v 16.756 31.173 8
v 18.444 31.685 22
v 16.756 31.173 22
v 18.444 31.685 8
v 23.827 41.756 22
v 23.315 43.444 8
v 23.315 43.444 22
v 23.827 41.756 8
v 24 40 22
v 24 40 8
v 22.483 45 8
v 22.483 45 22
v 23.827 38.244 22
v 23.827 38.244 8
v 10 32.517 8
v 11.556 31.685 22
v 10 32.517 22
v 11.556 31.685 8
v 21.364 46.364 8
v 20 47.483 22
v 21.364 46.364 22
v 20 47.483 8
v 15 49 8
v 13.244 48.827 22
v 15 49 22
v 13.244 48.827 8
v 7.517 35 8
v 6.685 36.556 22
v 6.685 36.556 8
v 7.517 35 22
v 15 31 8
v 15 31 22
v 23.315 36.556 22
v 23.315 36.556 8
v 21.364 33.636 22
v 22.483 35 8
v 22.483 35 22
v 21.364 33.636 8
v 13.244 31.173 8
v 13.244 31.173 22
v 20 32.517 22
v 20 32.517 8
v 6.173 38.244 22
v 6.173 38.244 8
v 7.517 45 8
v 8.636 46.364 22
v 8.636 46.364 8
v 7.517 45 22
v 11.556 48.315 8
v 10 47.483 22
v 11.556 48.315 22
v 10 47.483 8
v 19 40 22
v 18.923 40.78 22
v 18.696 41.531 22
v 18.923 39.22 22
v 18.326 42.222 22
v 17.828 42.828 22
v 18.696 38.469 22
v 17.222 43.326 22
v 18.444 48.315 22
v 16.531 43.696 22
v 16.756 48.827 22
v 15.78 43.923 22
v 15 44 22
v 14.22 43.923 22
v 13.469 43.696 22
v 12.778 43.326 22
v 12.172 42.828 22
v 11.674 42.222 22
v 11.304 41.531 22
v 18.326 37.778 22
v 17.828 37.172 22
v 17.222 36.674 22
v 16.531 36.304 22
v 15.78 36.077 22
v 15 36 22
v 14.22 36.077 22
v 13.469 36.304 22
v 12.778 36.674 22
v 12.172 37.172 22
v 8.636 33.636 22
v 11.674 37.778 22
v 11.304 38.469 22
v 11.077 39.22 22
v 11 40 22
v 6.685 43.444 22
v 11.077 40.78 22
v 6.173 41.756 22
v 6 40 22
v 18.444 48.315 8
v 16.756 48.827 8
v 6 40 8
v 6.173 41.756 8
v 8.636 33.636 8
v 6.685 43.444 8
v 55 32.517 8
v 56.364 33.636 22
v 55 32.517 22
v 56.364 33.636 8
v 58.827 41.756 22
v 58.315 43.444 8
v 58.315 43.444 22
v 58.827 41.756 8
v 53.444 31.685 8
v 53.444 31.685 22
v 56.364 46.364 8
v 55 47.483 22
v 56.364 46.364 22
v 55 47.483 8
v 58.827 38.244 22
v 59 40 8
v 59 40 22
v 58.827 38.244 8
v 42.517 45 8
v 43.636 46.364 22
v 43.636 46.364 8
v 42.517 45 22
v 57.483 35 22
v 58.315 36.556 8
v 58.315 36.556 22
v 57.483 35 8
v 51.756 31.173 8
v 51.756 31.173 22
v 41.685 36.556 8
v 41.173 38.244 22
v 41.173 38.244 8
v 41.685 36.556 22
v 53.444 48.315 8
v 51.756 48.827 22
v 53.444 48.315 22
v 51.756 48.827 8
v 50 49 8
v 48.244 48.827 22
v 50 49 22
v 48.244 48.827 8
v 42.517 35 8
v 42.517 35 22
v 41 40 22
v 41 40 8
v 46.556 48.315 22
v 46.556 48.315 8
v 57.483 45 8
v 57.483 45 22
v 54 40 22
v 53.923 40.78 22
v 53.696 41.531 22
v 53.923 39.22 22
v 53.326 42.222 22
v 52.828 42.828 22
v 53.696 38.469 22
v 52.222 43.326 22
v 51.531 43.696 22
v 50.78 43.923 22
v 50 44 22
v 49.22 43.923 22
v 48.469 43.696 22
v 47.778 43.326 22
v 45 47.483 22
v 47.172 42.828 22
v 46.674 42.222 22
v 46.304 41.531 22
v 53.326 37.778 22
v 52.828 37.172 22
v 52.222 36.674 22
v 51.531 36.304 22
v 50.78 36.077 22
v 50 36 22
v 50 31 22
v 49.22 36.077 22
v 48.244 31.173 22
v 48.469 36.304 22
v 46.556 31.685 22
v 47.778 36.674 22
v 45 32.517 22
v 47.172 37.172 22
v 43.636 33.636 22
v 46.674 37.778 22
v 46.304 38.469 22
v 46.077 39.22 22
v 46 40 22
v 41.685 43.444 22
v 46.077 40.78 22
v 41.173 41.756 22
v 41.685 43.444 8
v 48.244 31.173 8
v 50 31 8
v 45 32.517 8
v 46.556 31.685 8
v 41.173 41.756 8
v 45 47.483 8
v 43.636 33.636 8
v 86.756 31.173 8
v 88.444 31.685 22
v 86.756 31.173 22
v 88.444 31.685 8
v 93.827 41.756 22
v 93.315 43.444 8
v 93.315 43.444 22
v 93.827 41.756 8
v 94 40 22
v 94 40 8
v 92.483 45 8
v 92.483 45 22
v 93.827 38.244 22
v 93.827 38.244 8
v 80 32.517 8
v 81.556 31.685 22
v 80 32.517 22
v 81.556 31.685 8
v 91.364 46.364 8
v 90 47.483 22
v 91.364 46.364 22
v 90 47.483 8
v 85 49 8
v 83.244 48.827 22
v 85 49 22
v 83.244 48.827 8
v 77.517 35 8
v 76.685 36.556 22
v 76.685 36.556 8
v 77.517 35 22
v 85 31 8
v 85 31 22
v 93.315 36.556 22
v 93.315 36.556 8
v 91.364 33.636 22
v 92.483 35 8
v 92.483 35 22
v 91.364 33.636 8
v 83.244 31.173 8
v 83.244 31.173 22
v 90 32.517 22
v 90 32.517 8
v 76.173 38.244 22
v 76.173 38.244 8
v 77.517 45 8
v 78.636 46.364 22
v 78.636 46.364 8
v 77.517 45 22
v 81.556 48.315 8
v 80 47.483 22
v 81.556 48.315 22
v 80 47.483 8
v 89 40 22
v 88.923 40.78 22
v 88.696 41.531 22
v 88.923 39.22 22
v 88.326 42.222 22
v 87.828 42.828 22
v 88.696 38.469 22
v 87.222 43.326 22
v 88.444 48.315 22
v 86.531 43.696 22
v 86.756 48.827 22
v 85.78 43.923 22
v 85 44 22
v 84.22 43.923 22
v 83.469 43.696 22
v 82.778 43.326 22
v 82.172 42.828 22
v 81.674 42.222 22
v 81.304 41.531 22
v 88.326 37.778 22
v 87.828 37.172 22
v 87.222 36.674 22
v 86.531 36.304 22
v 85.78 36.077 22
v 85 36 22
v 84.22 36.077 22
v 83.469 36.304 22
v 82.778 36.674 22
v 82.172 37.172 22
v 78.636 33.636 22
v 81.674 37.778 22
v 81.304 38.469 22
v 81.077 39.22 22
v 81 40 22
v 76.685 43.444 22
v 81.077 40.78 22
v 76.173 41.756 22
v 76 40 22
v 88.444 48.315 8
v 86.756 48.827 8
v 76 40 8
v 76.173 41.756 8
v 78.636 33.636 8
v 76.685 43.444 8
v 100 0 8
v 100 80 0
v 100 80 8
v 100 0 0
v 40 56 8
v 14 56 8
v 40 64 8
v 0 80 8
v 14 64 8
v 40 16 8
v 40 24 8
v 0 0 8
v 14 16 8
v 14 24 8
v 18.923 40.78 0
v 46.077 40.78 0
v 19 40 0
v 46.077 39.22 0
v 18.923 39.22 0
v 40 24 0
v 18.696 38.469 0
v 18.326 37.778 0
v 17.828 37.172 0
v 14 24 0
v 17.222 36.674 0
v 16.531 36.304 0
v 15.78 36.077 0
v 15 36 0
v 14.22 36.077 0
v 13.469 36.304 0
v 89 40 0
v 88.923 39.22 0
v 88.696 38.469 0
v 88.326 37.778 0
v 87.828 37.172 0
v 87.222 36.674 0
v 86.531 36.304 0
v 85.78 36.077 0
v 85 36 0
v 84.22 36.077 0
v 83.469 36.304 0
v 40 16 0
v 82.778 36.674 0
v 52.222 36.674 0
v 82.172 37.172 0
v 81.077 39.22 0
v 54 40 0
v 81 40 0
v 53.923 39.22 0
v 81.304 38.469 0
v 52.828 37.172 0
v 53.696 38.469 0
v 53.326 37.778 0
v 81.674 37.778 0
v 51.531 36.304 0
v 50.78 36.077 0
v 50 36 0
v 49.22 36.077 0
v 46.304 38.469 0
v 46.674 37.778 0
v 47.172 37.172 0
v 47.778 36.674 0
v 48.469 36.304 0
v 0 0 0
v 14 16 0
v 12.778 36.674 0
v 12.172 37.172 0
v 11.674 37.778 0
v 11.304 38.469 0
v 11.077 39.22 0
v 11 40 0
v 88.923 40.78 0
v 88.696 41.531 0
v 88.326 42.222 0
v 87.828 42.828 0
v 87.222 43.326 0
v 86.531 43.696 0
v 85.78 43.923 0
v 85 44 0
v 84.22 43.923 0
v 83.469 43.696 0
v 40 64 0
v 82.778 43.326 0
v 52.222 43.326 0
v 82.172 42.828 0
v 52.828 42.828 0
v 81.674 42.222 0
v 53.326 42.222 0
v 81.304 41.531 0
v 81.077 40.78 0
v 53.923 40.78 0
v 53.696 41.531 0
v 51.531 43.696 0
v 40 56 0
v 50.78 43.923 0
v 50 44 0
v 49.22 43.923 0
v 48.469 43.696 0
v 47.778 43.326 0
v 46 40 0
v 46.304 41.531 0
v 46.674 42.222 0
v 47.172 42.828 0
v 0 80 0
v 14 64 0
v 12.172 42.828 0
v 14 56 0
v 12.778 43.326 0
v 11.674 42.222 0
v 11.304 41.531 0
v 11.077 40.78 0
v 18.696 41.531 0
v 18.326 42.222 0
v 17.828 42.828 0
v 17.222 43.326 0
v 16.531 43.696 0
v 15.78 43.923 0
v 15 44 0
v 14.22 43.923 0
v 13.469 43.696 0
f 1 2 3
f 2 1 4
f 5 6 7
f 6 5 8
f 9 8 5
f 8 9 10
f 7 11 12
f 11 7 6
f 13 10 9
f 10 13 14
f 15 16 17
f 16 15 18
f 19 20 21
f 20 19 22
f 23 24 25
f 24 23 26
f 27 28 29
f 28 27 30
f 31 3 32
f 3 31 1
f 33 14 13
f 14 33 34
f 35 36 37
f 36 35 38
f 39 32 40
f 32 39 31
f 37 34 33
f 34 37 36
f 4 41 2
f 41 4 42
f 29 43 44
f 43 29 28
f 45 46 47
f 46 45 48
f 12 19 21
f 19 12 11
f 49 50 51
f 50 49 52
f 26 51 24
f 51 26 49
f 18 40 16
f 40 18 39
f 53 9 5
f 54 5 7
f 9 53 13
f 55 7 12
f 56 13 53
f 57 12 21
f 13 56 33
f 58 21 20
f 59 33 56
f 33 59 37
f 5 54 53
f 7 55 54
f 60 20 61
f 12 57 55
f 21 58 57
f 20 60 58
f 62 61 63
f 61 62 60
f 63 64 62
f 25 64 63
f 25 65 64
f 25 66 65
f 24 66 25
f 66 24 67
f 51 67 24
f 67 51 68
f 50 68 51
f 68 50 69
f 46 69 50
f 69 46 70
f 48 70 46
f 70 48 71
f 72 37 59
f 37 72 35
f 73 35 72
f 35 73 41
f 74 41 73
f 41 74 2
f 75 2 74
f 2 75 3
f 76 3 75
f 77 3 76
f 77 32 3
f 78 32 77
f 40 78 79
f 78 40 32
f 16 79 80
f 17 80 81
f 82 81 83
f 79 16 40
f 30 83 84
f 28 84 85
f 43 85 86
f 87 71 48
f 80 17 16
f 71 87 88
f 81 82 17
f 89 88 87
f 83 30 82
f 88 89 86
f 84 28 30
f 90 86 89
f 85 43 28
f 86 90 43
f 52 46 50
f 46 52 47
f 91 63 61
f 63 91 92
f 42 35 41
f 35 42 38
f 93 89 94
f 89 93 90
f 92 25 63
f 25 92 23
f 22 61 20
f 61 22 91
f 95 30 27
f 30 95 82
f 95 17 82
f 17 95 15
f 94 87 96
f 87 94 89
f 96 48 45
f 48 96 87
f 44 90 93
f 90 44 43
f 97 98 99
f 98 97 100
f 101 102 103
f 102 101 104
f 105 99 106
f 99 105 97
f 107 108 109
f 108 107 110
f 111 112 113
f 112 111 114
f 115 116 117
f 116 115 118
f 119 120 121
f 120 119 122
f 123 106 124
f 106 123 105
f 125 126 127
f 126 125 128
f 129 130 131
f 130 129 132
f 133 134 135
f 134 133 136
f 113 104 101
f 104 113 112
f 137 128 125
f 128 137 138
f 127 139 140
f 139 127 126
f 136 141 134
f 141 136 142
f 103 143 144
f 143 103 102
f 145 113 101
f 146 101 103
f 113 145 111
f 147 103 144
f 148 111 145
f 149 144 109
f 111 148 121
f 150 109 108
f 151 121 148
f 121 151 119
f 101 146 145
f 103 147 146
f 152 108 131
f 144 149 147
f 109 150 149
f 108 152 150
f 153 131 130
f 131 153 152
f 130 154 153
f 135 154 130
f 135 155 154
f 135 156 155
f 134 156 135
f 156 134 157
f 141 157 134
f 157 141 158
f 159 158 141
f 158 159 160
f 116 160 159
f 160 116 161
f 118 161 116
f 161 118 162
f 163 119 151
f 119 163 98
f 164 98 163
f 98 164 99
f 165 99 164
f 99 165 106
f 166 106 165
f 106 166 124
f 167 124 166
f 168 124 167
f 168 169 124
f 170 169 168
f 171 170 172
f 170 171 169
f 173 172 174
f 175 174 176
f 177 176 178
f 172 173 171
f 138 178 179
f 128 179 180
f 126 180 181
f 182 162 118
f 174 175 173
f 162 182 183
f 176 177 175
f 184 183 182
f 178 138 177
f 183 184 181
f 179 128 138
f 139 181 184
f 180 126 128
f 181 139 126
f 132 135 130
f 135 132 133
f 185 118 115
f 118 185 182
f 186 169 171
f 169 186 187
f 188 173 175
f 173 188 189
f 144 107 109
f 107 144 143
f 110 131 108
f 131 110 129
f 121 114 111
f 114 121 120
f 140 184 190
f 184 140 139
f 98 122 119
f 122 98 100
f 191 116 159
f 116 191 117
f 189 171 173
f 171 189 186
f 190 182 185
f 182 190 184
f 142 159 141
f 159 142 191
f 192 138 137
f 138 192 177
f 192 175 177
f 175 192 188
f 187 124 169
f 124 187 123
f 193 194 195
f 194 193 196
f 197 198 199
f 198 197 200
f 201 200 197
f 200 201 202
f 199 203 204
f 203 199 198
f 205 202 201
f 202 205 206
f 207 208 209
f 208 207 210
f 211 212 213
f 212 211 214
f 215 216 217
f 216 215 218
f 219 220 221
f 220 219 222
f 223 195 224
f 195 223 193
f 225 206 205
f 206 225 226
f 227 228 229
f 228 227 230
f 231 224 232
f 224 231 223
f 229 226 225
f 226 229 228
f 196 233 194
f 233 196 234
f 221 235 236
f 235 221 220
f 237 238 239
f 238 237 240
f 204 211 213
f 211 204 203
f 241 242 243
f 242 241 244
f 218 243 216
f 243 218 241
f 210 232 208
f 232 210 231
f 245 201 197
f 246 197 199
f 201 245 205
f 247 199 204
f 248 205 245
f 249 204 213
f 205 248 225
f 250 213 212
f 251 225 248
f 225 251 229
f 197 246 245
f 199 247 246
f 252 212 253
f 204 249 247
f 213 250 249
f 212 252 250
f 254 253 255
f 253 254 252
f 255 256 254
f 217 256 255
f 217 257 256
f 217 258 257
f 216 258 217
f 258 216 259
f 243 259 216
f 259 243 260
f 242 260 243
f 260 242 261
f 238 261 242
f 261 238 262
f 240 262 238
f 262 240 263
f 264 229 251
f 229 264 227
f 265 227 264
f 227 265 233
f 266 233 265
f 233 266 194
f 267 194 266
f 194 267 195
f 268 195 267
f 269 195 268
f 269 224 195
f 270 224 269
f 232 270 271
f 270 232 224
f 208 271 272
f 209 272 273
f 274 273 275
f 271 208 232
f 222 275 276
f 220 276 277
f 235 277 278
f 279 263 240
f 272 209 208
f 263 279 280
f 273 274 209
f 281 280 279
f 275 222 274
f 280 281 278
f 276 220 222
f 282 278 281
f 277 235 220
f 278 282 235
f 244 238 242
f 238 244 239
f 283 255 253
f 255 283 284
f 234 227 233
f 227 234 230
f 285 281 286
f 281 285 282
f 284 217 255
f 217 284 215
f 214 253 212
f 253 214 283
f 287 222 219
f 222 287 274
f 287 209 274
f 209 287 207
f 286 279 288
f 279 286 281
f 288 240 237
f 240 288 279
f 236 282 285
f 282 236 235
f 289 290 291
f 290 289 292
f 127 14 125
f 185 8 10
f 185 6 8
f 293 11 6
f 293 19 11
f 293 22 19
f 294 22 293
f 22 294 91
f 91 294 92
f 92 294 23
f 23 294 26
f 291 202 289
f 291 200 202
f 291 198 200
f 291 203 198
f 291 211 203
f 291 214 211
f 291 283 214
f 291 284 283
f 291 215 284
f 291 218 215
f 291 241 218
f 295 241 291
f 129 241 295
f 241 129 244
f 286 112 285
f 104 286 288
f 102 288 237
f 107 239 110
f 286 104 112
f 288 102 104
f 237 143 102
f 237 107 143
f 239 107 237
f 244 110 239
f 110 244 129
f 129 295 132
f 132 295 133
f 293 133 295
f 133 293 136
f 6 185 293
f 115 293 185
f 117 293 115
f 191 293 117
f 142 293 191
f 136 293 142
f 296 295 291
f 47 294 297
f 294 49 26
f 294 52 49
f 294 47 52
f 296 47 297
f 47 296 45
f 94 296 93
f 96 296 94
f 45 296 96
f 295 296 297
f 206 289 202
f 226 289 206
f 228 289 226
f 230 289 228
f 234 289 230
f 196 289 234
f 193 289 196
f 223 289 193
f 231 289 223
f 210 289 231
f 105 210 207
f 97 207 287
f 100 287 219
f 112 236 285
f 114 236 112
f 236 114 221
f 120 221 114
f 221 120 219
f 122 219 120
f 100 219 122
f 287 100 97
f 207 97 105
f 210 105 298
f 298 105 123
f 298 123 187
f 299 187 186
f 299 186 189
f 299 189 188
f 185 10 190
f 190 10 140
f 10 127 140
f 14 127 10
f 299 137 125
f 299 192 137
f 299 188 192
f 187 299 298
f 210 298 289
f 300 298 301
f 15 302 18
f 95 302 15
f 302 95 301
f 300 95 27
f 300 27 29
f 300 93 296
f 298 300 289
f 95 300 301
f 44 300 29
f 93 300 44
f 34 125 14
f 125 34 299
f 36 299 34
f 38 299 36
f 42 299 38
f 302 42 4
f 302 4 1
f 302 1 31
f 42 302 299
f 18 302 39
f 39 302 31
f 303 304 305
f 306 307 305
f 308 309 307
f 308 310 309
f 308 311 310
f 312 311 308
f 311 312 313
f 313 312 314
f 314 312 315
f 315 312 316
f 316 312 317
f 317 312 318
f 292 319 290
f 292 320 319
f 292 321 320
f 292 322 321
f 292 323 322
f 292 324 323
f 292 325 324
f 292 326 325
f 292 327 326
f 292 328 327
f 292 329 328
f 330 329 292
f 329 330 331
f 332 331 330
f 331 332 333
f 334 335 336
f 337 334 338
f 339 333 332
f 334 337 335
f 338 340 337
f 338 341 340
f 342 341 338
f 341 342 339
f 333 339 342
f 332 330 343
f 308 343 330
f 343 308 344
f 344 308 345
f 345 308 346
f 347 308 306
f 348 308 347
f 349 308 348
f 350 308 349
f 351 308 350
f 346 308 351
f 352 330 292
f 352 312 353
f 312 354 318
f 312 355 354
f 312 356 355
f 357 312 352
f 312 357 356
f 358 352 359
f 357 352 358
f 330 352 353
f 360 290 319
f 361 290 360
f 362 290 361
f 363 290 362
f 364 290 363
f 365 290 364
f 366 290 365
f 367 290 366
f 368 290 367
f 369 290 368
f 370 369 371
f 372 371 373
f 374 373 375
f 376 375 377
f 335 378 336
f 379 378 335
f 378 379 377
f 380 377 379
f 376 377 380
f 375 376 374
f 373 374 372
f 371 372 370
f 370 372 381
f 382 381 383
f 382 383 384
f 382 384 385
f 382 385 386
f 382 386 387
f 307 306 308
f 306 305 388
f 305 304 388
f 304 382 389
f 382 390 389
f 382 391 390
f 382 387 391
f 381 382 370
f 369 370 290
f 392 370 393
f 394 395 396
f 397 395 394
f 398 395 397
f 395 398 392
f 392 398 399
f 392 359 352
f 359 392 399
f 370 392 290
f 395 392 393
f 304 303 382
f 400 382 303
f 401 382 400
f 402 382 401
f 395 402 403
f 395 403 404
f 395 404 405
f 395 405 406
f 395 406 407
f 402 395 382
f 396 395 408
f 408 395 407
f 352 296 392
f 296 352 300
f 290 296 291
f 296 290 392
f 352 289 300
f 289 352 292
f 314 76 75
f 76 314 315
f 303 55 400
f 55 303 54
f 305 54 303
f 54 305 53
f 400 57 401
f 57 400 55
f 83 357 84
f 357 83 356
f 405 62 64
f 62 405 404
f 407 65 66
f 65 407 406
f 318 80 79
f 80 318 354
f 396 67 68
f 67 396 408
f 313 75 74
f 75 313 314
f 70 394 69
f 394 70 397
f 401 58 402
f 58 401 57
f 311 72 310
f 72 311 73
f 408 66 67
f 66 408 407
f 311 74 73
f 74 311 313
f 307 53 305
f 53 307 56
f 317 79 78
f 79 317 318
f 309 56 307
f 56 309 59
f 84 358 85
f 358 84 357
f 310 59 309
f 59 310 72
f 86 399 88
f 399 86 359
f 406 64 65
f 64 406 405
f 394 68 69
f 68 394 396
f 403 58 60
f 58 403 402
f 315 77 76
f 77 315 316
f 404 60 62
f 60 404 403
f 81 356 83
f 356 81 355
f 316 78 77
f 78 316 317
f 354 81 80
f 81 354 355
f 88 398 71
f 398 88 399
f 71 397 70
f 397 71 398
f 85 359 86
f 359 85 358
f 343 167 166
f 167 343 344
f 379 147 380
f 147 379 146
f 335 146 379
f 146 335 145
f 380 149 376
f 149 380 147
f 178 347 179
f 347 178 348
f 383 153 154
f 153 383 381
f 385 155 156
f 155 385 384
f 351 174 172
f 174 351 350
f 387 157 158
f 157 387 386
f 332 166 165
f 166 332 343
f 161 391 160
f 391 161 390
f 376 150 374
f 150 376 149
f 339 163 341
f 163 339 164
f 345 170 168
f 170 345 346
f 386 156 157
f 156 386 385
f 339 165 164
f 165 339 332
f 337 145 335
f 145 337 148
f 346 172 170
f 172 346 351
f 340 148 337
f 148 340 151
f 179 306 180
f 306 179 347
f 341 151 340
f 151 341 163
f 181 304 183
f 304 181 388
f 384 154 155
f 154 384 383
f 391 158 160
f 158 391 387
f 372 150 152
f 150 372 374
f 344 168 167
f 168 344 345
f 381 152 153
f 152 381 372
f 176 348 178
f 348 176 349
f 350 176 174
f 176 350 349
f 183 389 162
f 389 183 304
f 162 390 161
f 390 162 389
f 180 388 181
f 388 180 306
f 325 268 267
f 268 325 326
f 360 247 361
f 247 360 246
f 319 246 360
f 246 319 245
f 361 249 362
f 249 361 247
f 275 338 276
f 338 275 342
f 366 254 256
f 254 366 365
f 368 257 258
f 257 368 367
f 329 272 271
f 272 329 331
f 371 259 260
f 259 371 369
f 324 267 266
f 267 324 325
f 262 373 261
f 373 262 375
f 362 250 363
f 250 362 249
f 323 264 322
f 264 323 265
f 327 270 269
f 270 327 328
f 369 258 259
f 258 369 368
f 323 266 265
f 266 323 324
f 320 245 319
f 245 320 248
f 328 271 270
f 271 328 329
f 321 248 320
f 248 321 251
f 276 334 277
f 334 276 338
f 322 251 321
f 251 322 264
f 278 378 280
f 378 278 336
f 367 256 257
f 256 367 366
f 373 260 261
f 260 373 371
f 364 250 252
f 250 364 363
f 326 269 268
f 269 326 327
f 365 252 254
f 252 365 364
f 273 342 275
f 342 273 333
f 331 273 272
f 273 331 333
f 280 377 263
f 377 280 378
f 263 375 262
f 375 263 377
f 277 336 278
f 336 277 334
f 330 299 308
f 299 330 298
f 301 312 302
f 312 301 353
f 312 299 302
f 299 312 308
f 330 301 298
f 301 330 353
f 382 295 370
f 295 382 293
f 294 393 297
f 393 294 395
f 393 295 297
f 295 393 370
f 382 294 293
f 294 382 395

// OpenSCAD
$fn = 32;

// ----------------------------------------------------------------------
// Drill jig: three_boss_slot jig
// ----------------------------------------------------------------------

// --- parameters (mm) ---
plate_l = 100;            // plate length, X
plate_w = 80;             // plate width, Y
plate_t = 8;              // plate thickness
boss_d = 18;              // guide boss diameter
boss_h = 15;              // boss height above the plate
guide_d = 8;              // guide hole diameter
boss_pitch = 35;          // boss pitch
slot_w = 8;               // clamp slot width
slot_l = 26;              // clamp slot length
slot_x = 14;              // slot start X

n_boss = 3;  // guide bosses
boss_x0 = (plate_l - (n_boss - 1) * boss_pitch) / 2;  // first boss X
boss_top = plate_t - 1 + boss_h;  // boss crown height
total_h = boss_top;  // overall height

difference() {
  union() {
  cube([plate_l, plate_w, plate_t]);
  for (i = [0 : n_boss - 1])
    translate([boss_x0 + i * boss_pitch, plate_w / 2, plate_t - 1])
      cylinder(h = boss_h, d = boss_d);
  }
  for (i = [0 : n_boss - 1])
    translate([boss_x0 + i * boss_pitch, plate_w / 2, -1])
      cylinder(h = plate_t + boss_h, d = guide_d);
  for (cy = [plate_w * 0.25, plate_w * 0.75])
    translate([slot_x, cy - slot_w / 2, -1])
      cube([slot_l, slot_w, plate_t + 2]);
}
